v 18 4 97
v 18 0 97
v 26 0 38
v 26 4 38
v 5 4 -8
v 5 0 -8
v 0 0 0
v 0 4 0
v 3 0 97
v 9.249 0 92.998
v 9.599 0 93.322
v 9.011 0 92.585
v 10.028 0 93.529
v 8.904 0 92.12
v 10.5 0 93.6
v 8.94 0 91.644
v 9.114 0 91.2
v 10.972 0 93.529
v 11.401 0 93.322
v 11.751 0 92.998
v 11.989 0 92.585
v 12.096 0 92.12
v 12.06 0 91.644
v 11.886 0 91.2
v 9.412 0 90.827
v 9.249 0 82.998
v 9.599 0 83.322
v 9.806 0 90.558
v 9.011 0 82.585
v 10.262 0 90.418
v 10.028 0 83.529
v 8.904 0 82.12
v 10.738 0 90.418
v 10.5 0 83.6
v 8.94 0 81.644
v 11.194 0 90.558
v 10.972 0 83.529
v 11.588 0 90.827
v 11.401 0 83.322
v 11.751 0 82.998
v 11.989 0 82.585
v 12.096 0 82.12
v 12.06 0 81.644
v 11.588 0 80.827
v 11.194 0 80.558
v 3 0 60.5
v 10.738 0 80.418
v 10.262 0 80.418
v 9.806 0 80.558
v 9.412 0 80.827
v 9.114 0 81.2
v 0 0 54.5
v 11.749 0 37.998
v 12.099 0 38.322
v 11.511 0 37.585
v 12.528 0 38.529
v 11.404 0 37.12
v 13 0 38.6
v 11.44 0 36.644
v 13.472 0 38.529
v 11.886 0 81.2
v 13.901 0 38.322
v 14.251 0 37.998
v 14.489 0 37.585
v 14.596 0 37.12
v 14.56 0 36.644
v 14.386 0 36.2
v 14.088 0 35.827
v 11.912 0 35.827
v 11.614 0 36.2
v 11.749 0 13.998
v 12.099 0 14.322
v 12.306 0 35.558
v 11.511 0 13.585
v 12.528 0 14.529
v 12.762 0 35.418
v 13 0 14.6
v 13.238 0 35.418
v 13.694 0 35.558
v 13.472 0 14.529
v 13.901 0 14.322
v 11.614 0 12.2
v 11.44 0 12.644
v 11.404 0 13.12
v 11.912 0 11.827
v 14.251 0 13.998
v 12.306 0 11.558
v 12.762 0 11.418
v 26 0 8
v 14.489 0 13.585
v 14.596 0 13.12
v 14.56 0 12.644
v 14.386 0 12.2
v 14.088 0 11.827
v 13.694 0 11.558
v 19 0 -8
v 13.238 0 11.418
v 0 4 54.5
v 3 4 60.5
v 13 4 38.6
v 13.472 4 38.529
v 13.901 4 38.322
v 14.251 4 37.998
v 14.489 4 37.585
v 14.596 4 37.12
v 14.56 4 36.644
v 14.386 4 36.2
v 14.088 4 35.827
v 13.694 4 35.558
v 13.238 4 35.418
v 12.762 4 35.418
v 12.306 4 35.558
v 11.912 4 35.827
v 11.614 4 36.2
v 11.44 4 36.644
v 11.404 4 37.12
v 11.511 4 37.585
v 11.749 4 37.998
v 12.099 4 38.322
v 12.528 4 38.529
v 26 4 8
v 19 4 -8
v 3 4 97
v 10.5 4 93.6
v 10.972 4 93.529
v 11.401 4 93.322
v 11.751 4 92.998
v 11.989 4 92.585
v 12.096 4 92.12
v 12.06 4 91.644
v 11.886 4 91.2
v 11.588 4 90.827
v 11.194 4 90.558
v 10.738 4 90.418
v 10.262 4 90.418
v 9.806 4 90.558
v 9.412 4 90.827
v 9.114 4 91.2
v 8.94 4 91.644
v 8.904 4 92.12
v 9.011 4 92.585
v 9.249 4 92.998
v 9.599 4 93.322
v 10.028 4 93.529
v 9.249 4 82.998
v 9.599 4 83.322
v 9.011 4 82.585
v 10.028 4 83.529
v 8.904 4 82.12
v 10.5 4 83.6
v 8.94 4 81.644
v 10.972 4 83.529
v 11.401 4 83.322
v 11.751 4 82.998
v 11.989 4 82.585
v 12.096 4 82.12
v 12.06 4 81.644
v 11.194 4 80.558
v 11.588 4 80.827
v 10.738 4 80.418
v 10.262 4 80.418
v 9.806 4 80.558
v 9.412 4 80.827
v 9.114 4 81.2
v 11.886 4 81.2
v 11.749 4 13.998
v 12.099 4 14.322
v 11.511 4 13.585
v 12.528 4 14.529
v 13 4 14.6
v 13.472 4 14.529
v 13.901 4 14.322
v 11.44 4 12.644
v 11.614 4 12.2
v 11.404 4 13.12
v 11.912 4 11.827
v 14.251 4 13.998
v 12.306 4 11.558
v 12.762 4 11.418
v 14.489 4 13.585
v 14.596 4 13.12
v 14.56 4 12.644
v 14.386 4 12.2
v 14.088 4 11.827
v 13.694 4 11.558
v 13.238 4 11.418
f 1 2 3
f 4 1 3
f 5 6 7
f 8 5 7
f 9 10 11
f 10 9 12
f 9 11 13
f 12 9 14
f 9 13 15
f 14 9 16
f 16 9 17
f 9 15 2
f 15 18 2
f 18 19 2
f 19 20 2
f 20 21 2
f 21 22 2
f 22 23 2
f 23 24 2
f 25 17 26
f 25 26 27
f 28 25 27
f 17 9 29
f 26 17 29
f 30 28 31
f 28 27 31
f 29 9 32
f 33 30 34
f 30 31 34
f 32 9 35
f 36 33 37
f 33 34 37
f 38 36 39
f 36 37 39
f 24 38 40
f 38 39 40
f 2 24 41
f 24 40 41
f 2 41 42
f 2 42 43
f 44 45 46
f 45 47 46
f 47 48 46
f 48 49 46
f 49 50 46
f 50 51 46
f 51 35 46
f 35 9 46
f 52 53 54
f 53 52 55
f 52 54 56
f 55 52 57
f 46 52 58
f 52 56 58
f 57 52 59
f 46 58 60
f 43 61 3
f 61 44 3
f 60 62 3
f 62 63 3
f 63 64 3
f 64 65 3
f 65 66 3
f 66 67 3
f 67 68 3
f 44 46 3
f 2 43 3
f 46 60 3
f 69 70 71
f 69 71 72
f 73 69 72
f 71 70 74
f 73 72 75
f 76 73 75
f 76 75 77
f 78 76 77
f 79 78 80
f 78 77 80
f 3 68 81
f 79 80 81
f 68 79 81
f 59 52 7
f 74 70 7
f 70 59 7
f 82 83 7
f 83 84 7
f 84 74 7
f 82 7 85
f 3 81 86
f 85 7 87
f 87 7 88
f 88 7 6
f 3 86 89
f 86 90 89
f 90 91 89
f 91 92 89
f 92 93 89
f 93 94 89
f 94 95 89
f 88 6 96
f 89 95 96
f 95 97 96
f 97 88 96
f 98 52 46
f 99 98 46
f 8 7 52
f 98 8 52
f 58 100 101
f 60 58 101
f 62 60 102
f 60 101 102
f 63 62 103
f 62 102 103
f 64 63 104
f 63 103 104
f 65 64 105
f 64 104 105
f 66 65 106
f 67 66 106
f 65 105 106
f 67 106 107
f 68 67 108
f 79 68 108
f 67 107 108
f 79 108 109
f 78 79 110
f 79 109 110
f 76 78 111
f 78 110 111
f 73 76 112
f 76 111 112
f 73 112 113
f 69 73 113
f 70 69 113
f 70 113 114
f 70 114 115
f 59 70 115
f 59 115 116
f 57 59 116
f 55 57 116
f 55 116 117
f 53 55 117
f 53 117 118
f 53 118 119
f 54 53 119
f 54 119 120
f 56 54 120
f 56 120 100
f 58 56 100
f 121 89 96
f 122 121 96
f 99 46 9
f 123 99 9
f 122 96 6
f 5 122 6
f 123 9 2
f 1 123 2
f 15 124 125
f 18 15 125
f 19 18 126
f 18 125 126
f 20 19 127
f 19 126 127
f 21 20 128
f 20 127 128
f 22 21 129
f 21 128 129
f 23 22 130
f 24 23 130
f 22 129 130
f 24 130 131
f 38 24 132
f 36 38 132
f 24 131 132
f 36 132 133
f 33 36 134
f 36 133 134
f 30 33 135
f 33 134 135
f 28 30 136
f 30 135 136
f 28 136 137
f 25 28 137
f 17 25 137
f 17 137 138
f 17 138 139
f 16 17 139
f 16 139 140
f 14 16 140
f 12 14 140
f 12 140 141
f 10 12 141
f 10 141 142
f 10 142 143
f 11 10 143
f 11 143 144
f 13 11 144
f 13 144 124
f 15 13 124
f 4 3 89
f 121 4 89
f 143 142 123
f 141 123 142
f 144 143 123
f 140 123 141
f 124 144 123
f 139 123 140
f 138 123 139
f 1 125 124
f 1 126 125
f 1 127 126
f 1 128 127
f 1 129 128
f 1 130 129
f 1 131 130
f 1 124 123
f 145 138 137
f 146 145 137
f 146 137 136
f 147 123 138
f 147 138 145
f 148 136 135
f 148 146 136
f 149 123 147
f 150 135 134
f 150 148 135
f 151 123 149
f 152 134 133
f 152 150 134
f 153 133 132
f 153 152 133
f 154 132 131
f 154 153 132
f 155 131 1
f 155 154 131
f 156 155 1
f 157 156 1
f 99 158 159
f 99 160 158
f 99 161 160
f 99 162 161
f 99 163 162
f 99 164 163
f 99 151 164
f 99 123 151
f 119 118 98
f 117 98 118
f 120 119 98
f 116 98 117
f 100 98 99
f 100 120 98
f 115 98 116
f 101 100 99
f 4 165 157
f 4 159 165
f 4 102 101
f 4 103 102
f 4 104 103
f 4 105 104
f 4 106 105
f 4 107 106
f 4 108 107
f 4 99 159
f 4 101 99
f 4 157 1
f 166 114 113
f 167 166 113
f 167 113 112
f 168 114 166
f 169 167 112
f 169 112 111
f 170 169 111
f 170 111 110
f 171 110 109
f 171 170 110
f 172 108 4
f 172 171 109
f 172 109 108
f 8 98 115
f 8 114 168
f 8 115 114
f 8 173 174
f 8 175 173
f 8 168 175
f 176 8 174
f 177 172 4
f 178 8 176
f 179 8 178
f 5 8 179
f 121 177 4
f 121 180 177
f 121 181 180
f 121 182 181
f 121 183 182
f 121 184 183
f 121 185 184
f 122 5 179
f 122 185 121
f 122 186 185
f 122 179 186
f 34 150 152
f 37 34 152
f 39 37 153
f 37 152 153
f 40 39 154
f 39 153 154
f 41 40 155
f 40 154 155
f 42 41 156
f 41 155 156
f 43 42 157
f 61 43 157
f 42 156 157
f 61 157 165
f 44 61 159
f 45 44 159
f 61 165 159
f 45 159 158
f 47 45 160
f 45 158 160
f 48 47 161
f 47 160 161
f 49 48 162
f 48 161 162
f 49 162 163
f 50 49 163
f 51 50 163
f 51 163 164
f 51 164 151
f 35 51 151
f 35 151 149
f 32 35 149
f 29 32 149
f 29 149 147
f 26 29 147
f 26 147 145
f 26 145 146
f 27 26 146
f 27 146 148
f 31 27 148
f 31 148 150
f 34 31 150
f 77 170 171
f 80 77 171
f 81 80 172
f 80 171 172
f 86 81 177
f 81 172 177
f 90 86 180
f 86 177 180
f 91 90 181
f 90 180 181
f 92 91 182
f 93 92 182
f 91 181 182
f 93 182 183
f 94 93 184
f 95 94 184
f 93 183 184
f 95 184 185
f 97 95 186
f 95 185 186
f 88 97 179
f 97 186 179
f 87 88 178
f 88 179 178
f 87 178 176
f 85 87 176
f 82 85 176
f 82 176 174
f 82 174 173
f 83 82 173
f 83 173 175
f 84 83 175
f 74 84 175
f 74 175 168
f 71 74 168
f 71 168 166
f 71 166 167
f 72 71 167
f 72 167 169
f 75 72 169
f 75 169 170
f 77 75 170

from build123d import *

# Parameters (mm, degrees)
BOSS_EXTRUDE1_DEPTH = 4
SKETCH2_R           = 1.6
CUT_EXTRUDE1_DEPTH  = 101.503731274


with BuildPart() as part:
    # Sketch1 → Boss-Extrude1 (new body)
    with BuildSketch(Plane(origin=(0, 0, 0), x_dir=(1, 0, 0), z_dir=(0, 1, 0))):
        Polygon((0, 0), (0, -54.5), (3, -60.5), (3, -97), (18, -97), (26, -38), (26, -8), (19, 8), (5, 8), align=None)
    extrude(amount=BOSS_EXTRUDE1_DEPTH)

    # Sketch2 → Cut-Extrude1 (cut, through all)
    with BuildSketch(Plane(origin=(0, 4, 0), x_dir=(1, 0, 0), z_dir=(0, 1, 0))):
        with Locations(Location((13, -13, 0), (0, 0, 270))):
            Circle(SKETCH2_R)
        with Locations(Location((13, -37, 0), (0, 0, 270))):
            Circle(SKETCH2_R)
        with Locations(Location((10.5, -82, 0), (0, 0, 270))):
            Circle(SKETCH2_R)
        with Locations(Location((10.5, -92, 0), (0, 0, 270))):
            Circle(SKETCH2_R)
    extrude(amount=-CUT_EXTRUDE1_DEPTH, mode=Mode.SUBTRACT)


solid = part.part
